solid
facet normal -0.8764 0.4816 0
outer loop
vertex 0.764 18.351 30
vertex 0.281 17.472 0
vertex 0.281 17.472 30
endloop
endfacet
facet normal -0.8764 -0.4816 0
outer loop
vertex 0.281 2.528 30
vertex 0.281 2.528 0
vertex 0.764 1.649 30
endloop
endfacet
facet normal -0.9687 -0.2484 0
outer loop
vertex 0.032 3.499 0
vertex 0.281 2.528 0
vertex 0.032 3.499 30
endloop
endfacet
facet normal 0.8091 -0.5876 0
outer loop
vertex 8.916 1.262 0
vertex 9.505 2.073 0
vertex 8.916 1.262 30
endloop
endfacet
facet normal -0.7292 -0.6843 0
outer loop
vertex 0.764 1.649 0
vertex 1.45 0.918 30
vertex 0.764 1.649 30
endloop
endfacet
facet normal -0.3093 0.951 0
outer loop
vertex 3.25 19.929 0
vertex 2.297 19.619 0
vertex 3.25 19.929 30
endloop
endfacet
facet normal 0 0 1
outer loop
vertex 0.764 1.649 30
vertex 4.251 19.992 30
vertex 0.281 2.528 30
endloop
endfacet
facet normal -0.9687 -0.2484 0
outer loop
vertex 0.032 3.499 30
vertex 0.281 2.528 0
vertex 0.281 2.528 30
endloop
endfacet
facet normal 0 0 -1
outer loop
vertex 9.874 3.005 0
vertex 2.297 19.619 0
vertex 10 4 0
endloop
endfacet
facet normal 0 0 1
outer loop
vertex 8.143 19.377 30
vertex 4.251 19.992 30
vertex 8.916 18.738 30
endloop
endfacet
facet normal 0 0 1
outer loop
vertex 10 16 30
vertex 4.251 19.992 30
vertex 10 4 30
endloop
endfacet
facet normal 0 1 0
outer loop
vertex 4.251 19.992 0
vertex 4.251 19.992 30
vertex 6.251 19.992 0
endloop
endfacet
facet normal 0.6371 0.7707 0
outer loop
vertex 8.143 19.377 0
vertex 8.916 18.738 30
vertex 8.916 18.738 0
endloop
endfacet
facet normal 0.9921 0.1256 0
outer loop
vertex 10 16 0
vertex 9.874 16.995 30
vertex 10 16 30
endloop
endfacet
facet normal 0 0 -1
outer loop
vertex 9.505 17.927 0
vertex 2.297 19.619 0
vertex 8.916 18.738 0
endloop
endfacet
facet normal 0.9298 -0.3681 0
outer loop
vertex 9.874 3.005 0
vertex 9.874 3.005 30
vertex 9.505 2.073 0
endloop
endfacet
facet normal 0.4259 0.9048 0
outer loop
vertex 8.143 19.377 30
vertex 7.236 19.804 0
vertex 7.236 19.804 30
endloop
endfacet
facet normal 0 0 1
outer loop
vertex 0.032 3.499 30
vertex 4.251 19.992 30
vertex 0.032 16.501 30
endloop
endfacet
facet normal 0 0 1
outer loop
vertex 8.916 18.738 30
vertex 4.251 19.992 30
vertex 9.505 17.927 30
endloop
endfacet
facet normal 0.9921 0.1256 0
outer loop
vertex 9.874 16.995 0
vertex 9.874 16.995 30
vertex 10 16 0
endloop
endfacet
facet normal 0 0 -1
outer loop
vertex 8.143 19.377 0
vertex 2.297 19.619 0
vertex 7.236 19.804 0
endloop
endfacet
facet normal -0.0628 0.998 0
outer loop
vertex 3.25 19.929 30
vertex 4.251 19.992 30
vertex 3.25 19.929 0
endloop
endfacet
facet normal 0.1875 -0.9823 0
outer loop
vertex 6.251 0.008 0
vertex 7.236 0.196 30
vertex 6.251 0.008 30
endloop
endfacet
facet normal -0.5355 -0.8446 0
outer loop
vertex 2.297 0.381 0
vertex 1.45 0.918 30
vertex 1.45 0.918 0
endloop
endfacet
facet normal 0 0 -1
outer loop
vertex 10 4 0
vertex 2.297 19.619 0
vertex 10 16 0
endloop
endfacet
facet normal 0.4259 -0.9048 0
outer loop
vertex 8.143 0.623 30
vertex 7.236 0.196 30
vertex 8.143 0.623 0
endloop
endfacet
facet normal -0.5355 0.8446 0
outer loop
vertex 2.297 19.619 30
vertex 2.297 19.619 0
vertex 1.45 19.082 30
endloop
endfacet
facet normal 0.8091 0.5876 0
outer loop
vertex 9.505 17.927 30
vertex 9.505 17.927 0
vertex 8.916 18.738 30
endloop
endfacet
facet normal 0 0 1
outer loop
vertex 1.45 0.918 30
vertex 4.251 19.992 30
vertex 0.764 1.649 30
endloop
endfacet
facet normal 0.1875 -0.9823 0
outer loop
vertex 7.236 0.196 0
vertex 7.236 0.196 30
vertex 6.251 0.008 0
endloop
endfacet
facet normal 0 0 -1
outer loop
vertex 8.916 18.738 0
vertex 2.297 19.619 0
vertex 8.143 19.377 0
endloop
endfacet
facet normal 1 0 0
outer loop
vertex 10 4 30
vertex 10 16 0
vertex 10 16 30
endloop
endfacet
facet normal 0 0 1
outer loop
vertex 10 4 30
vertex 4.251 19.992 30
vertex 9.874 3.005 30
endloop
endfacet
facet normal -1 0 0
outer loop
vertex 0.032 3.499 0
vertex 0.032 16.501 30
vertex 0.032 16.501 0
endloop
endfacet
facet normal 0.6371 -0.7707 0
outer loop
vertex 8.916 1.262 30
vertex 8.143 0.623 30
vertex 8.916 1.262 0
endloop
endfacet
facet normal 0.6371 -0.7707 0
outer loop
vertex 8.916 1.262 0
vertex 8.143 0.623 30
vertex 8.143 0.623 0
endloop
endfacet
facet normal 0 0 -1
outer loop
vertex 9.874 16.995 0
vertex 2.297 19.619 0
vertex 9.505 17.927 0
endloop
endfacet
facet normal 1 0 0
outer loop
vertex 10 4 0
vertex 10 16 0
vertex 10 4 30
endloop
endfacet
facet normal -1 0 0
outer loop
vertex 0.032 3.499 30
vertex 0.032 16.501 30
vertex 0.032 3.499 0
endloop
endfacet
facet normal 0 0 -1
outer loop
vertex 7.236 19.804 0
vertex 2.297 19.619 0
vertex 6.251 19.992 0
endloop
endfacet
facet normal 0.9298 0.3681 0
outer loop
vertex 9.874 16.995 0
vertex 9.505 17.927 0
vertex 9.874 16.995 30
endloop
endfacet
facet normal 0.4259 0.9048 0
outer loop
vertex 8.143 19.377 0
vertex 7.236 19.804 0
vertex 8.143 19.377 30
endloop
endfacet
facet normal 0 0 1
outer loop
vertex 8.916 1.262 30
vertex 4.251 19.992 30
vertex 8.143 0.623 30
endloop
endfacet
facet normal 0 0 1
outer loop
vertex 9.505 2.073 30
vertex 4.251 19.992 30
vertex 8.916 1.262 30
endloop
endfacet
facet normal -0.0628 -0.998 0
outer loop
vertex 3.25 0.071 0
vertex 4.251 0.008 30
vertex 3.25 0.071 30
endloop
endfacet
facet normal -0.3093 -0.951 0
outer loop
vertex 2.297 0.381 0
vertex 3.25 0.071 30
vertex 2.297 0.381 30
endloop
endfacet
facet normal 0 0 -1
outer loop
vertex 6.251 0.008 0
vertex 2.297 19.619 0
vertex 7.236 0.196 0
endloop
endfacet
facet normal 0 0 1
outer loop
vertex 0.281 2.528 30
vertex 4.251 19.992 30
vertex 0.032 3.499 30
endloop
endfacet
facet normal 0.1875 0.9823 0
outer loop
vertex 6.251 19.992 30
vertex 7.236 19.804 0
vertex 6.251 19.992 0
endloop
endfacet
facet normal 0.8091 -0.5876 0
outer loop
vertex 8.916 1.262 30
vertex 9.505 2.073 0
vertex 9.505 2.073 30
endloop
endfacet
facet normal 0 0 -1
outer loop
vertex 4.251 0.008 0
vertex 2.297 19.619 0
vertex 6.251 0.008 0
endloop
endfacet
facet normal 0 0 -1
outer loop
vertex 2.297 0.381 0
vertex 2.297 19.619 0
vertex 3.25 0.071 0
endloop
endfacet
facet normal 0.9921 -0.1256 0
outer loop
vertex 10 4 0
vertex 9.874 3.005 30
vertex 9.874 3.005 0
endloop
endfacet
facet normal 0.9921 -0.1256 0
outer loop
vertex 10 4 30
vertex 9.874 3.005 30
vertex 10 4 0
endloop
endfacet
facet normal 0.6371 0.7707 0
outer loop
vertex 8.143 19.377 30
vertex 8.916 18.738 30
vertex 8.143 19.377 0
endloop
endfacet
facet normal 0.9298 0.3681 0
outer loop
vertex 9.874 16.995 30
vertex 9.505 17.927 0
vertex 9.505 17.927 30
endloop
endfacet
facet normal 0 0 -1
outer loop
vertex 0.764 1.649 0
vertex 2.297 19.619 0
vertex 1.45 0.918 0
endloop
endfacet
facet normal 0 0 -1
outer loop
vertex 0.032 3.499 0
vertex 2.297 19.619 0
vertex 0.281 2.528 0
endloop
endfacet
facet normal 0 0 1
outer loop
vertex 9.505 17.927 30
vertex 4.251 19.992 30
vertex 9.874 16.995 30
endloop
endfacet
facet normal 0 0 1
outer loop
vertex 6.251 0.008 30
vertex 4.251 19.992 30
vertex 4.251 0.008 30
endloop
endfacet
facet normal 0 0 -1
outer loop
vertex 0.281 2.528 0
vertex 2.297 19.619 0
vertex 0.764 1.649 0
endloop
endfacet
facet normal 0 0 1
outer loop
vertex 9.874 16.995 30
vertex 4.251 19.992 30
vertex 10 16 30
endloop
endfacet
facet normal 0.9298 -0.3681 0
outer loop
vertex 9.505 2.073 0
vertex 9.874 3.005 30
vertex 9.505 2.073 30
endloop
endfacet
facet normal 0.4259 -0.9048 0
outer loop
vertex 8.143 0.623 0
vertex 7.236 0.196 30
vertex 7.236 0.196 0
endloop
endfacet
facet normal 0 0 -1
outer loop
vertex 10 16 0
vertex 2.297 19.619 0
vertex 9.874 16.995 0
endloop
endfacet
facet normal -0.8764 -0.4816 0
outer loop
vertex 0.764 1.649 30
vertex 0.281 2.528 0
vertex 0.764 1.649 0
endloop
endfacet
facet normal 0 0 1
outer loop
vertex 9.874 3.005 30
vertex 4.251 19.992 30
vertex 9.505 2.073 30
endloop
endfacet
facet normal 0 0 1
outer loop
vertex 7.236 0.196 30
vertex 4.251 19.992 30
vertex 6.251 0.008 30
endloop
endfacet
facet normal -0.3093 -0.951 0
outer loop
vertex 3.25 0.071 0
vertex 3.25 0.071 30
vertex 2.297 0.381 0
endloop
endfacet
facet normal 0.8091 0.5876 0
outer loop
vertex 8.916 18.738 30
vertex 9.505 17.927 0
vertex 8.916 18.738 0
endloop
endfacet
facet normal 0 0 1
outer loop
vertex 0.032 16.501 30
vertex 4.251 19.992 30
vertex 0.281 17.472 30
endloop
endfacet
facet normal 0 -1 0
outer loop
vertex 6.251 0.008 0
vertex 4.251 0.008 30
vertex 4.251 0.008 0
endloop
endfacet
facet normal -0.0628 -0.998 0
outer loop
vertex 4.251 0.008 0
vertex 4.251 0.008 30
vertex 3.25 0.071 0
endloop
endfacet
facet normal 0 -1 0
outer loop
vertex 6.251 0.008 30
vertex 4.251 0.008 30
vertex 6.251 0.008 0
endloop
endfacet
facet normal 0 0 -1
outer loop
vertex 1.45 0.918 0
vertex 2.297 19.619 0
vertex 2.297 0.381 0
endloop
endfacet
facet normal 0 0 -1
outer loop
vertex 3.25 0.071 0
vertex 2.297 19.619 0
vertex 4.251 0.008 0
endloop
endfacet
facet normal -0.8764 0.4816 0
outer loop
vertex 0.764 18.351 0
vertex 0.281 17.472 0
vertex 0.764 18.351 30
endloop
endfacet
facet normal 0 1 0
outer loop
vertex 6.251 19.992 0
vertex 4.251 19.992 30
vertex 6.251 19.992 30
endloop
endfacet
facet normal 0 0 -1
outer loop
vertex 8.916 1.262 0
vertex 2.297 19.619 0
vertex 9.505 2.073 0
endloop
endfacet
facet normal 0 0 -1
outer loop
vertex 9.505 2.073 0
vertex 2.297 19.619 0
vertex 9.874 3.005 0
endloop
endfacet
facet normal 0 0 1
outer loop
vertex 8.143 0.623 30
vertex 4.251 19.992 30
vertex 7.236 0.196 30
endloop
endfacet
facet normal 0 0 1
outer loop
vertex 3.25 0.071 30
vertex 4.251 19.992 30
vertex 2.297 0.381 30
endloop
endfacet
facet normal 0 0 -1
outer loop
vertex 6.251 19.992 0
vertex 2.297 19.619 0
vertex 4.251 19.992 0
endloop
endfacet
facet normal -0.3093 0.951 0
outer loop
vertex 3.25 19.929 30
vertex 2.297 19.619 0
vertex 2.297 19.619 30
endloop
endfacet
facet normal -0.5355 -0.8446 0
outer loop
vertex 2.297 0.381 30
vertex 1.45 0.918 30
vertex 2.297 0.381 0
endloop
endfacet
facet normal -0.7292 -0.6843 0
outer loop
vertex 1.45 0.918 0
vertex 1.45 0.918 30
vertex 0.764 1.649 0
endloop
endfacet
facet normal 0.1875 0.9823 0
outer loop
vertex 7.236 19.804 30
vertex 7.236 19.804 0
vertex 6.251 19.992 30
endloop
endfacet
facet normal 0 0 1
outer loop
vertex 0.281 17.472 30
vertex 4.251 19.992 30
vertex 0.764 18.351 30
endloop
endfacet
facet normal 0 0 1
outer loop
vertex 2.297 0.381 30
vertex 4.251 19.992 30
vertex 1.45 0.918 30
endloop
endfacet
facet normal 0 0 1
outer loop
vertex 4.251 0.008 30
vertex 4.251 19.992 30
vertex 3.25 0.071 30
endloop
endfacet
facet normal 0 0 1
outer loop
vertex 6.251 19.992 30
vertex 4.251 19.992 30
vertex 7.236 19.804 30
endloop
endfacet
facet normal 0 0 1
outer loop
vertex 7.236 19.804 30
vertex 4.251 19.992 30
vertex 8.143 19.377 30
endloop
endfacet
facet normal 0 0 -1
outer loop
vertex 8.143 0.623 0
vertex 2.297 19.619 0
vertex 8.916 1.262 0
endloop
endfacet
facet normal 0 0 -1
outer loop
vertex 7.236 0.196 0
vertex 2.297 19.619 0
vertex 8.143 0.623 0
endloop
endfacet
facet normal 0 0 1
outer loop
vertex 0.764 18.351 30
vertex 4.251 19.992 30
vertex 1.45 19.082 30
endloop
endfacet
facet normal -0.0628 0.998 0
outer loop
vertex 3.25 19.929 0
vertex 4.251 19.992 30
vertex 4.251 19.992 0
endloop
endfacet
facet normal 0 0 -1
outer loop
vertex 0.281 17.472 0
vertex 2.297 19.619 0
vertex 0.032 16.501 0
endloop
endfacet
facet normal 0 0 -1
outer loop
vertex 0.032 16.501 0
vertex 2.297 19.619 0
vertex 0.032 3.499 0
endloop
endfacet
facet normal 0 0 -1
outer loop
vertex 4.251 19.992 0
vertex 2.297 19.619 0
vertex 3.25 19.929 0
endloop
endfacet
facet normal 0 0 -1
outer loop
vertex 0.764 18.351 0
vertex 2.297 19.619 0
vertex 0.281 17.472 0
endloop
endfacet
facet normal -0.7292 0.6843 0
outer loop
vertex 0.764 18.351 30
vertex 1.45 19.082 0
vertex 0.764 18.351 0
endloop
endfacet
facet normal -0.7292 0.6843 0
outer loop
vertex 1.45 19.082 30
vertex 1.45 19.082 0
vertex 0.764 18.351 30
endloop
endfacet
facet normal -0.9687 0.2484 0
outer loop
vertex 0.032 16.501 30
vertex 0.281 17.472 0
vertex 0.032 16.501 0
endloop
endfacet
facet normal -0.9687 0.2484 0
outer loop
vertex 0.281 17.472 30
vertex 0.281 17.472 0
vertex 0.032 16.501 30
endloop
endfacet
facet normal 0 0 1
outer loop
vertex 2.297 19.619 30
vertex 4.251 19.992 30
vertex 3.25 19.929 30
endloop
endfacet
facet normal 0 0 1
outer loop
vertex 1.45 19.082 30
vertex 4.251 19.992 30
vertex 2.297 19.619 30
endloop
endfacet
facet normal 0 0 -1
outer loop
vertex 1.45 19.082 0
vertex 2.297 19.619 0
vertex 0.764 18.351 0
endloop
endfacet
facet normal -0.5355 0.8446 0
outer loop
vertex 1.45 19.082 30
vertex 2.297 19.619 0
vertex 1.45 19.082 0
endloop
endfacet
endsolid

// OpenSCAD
//divided_box(100, 50, 30, 4, 2, 8, 3, 2, 25,0,[1]);
smooth_rect(10,20,30,4);
//Divided box module
//x, y, and z are the size of the box.
//base_ht is the thickness of the base.
//wall_t is the thickness of the walls.
//crad is the radius of the corners. If it's <= 0, the box will have sharp corners.
//If either the base height or the wall thickness are <= 0, the box will be solid.
//x_div and y_div are the numbers of divisions in the box in the x and y directions.
//div_height is the height of the dividers; if <=0, this is set to the height of the box.
//x_skips and y_skips are arrays that list the numbered dividers to skip.

module divided_box(x, y, z,
                    base_ht = 0,
                    wall_t = 0,
                    crad = 0,
                    x_div = 0,
                    y_div = 0,
                    div_height = 0,
                    x_skips = [], y_skips = [])
{
    translate([-x/2, -y/2, 0])
    {
        int_crad = crad - wall_t;
        //Set or clear the divider heights
        divider_height = div_height <=0? z:div_height;
        //Set or clear whether or not the box is solid
        solidbox = ((base_ht <= 0)||(wall_t <= 0))? true:false;
        echo ("Solidbox: ");
        echo (solidbox);
    //    bht = box_base_height;
        difference() {
            //Outside of box:
            smooth_rect(x, y, z,crad);
            //If not a solid box, remove the inside area:
            if (!solidbox)
            {
                translate([crad-int_crad, crad-int_crad, base_ht]) smooth_rect(x - 2*wall_t, y - 2*wall_t, z, int_crad);
            }
        }
        //Add the X dividers
        if (x_div > 0) {
            for(i = [1:x_div])
            {
                skip = len(search(i, x_skips)) > 0? true : false;
                if (!skip)
                {
                    compartment = (x)/(x_div + 1);
                    translate([compartment * i - (wall_t/2),0,0]) cube([wall_t, y, divider_height]);
                }
            }
        }
        if (y_div > 0) {
            for(i = [1:y_div])
            {
                skip = len(search(i, y_skips)) > 0? true : false;
                if (!skip)
                {
                    compartment = (y)/(y_div + 1);
                    translate([0,compartment * i - (wall_t/2),0]) cube([x, wall_t, divider_height]);
                }
            }
        }
    }
}

module smooth_rect(x, y, z, rad)
{
    module corner()
        {
            cylinder(z,rad,rad,$fn=25);
        }
    if (rad > 0)
    {
        hull() {
            translate([rad,rad,0]) corner();
            translate([x-rad,rad,0]) corner();
            translate([rad,y-rad,0]) corner();
            translate([x-rad,y-rad,0]) corner();
        }
    }
    else
    {
        cube([x,y,z]);
    }
}
